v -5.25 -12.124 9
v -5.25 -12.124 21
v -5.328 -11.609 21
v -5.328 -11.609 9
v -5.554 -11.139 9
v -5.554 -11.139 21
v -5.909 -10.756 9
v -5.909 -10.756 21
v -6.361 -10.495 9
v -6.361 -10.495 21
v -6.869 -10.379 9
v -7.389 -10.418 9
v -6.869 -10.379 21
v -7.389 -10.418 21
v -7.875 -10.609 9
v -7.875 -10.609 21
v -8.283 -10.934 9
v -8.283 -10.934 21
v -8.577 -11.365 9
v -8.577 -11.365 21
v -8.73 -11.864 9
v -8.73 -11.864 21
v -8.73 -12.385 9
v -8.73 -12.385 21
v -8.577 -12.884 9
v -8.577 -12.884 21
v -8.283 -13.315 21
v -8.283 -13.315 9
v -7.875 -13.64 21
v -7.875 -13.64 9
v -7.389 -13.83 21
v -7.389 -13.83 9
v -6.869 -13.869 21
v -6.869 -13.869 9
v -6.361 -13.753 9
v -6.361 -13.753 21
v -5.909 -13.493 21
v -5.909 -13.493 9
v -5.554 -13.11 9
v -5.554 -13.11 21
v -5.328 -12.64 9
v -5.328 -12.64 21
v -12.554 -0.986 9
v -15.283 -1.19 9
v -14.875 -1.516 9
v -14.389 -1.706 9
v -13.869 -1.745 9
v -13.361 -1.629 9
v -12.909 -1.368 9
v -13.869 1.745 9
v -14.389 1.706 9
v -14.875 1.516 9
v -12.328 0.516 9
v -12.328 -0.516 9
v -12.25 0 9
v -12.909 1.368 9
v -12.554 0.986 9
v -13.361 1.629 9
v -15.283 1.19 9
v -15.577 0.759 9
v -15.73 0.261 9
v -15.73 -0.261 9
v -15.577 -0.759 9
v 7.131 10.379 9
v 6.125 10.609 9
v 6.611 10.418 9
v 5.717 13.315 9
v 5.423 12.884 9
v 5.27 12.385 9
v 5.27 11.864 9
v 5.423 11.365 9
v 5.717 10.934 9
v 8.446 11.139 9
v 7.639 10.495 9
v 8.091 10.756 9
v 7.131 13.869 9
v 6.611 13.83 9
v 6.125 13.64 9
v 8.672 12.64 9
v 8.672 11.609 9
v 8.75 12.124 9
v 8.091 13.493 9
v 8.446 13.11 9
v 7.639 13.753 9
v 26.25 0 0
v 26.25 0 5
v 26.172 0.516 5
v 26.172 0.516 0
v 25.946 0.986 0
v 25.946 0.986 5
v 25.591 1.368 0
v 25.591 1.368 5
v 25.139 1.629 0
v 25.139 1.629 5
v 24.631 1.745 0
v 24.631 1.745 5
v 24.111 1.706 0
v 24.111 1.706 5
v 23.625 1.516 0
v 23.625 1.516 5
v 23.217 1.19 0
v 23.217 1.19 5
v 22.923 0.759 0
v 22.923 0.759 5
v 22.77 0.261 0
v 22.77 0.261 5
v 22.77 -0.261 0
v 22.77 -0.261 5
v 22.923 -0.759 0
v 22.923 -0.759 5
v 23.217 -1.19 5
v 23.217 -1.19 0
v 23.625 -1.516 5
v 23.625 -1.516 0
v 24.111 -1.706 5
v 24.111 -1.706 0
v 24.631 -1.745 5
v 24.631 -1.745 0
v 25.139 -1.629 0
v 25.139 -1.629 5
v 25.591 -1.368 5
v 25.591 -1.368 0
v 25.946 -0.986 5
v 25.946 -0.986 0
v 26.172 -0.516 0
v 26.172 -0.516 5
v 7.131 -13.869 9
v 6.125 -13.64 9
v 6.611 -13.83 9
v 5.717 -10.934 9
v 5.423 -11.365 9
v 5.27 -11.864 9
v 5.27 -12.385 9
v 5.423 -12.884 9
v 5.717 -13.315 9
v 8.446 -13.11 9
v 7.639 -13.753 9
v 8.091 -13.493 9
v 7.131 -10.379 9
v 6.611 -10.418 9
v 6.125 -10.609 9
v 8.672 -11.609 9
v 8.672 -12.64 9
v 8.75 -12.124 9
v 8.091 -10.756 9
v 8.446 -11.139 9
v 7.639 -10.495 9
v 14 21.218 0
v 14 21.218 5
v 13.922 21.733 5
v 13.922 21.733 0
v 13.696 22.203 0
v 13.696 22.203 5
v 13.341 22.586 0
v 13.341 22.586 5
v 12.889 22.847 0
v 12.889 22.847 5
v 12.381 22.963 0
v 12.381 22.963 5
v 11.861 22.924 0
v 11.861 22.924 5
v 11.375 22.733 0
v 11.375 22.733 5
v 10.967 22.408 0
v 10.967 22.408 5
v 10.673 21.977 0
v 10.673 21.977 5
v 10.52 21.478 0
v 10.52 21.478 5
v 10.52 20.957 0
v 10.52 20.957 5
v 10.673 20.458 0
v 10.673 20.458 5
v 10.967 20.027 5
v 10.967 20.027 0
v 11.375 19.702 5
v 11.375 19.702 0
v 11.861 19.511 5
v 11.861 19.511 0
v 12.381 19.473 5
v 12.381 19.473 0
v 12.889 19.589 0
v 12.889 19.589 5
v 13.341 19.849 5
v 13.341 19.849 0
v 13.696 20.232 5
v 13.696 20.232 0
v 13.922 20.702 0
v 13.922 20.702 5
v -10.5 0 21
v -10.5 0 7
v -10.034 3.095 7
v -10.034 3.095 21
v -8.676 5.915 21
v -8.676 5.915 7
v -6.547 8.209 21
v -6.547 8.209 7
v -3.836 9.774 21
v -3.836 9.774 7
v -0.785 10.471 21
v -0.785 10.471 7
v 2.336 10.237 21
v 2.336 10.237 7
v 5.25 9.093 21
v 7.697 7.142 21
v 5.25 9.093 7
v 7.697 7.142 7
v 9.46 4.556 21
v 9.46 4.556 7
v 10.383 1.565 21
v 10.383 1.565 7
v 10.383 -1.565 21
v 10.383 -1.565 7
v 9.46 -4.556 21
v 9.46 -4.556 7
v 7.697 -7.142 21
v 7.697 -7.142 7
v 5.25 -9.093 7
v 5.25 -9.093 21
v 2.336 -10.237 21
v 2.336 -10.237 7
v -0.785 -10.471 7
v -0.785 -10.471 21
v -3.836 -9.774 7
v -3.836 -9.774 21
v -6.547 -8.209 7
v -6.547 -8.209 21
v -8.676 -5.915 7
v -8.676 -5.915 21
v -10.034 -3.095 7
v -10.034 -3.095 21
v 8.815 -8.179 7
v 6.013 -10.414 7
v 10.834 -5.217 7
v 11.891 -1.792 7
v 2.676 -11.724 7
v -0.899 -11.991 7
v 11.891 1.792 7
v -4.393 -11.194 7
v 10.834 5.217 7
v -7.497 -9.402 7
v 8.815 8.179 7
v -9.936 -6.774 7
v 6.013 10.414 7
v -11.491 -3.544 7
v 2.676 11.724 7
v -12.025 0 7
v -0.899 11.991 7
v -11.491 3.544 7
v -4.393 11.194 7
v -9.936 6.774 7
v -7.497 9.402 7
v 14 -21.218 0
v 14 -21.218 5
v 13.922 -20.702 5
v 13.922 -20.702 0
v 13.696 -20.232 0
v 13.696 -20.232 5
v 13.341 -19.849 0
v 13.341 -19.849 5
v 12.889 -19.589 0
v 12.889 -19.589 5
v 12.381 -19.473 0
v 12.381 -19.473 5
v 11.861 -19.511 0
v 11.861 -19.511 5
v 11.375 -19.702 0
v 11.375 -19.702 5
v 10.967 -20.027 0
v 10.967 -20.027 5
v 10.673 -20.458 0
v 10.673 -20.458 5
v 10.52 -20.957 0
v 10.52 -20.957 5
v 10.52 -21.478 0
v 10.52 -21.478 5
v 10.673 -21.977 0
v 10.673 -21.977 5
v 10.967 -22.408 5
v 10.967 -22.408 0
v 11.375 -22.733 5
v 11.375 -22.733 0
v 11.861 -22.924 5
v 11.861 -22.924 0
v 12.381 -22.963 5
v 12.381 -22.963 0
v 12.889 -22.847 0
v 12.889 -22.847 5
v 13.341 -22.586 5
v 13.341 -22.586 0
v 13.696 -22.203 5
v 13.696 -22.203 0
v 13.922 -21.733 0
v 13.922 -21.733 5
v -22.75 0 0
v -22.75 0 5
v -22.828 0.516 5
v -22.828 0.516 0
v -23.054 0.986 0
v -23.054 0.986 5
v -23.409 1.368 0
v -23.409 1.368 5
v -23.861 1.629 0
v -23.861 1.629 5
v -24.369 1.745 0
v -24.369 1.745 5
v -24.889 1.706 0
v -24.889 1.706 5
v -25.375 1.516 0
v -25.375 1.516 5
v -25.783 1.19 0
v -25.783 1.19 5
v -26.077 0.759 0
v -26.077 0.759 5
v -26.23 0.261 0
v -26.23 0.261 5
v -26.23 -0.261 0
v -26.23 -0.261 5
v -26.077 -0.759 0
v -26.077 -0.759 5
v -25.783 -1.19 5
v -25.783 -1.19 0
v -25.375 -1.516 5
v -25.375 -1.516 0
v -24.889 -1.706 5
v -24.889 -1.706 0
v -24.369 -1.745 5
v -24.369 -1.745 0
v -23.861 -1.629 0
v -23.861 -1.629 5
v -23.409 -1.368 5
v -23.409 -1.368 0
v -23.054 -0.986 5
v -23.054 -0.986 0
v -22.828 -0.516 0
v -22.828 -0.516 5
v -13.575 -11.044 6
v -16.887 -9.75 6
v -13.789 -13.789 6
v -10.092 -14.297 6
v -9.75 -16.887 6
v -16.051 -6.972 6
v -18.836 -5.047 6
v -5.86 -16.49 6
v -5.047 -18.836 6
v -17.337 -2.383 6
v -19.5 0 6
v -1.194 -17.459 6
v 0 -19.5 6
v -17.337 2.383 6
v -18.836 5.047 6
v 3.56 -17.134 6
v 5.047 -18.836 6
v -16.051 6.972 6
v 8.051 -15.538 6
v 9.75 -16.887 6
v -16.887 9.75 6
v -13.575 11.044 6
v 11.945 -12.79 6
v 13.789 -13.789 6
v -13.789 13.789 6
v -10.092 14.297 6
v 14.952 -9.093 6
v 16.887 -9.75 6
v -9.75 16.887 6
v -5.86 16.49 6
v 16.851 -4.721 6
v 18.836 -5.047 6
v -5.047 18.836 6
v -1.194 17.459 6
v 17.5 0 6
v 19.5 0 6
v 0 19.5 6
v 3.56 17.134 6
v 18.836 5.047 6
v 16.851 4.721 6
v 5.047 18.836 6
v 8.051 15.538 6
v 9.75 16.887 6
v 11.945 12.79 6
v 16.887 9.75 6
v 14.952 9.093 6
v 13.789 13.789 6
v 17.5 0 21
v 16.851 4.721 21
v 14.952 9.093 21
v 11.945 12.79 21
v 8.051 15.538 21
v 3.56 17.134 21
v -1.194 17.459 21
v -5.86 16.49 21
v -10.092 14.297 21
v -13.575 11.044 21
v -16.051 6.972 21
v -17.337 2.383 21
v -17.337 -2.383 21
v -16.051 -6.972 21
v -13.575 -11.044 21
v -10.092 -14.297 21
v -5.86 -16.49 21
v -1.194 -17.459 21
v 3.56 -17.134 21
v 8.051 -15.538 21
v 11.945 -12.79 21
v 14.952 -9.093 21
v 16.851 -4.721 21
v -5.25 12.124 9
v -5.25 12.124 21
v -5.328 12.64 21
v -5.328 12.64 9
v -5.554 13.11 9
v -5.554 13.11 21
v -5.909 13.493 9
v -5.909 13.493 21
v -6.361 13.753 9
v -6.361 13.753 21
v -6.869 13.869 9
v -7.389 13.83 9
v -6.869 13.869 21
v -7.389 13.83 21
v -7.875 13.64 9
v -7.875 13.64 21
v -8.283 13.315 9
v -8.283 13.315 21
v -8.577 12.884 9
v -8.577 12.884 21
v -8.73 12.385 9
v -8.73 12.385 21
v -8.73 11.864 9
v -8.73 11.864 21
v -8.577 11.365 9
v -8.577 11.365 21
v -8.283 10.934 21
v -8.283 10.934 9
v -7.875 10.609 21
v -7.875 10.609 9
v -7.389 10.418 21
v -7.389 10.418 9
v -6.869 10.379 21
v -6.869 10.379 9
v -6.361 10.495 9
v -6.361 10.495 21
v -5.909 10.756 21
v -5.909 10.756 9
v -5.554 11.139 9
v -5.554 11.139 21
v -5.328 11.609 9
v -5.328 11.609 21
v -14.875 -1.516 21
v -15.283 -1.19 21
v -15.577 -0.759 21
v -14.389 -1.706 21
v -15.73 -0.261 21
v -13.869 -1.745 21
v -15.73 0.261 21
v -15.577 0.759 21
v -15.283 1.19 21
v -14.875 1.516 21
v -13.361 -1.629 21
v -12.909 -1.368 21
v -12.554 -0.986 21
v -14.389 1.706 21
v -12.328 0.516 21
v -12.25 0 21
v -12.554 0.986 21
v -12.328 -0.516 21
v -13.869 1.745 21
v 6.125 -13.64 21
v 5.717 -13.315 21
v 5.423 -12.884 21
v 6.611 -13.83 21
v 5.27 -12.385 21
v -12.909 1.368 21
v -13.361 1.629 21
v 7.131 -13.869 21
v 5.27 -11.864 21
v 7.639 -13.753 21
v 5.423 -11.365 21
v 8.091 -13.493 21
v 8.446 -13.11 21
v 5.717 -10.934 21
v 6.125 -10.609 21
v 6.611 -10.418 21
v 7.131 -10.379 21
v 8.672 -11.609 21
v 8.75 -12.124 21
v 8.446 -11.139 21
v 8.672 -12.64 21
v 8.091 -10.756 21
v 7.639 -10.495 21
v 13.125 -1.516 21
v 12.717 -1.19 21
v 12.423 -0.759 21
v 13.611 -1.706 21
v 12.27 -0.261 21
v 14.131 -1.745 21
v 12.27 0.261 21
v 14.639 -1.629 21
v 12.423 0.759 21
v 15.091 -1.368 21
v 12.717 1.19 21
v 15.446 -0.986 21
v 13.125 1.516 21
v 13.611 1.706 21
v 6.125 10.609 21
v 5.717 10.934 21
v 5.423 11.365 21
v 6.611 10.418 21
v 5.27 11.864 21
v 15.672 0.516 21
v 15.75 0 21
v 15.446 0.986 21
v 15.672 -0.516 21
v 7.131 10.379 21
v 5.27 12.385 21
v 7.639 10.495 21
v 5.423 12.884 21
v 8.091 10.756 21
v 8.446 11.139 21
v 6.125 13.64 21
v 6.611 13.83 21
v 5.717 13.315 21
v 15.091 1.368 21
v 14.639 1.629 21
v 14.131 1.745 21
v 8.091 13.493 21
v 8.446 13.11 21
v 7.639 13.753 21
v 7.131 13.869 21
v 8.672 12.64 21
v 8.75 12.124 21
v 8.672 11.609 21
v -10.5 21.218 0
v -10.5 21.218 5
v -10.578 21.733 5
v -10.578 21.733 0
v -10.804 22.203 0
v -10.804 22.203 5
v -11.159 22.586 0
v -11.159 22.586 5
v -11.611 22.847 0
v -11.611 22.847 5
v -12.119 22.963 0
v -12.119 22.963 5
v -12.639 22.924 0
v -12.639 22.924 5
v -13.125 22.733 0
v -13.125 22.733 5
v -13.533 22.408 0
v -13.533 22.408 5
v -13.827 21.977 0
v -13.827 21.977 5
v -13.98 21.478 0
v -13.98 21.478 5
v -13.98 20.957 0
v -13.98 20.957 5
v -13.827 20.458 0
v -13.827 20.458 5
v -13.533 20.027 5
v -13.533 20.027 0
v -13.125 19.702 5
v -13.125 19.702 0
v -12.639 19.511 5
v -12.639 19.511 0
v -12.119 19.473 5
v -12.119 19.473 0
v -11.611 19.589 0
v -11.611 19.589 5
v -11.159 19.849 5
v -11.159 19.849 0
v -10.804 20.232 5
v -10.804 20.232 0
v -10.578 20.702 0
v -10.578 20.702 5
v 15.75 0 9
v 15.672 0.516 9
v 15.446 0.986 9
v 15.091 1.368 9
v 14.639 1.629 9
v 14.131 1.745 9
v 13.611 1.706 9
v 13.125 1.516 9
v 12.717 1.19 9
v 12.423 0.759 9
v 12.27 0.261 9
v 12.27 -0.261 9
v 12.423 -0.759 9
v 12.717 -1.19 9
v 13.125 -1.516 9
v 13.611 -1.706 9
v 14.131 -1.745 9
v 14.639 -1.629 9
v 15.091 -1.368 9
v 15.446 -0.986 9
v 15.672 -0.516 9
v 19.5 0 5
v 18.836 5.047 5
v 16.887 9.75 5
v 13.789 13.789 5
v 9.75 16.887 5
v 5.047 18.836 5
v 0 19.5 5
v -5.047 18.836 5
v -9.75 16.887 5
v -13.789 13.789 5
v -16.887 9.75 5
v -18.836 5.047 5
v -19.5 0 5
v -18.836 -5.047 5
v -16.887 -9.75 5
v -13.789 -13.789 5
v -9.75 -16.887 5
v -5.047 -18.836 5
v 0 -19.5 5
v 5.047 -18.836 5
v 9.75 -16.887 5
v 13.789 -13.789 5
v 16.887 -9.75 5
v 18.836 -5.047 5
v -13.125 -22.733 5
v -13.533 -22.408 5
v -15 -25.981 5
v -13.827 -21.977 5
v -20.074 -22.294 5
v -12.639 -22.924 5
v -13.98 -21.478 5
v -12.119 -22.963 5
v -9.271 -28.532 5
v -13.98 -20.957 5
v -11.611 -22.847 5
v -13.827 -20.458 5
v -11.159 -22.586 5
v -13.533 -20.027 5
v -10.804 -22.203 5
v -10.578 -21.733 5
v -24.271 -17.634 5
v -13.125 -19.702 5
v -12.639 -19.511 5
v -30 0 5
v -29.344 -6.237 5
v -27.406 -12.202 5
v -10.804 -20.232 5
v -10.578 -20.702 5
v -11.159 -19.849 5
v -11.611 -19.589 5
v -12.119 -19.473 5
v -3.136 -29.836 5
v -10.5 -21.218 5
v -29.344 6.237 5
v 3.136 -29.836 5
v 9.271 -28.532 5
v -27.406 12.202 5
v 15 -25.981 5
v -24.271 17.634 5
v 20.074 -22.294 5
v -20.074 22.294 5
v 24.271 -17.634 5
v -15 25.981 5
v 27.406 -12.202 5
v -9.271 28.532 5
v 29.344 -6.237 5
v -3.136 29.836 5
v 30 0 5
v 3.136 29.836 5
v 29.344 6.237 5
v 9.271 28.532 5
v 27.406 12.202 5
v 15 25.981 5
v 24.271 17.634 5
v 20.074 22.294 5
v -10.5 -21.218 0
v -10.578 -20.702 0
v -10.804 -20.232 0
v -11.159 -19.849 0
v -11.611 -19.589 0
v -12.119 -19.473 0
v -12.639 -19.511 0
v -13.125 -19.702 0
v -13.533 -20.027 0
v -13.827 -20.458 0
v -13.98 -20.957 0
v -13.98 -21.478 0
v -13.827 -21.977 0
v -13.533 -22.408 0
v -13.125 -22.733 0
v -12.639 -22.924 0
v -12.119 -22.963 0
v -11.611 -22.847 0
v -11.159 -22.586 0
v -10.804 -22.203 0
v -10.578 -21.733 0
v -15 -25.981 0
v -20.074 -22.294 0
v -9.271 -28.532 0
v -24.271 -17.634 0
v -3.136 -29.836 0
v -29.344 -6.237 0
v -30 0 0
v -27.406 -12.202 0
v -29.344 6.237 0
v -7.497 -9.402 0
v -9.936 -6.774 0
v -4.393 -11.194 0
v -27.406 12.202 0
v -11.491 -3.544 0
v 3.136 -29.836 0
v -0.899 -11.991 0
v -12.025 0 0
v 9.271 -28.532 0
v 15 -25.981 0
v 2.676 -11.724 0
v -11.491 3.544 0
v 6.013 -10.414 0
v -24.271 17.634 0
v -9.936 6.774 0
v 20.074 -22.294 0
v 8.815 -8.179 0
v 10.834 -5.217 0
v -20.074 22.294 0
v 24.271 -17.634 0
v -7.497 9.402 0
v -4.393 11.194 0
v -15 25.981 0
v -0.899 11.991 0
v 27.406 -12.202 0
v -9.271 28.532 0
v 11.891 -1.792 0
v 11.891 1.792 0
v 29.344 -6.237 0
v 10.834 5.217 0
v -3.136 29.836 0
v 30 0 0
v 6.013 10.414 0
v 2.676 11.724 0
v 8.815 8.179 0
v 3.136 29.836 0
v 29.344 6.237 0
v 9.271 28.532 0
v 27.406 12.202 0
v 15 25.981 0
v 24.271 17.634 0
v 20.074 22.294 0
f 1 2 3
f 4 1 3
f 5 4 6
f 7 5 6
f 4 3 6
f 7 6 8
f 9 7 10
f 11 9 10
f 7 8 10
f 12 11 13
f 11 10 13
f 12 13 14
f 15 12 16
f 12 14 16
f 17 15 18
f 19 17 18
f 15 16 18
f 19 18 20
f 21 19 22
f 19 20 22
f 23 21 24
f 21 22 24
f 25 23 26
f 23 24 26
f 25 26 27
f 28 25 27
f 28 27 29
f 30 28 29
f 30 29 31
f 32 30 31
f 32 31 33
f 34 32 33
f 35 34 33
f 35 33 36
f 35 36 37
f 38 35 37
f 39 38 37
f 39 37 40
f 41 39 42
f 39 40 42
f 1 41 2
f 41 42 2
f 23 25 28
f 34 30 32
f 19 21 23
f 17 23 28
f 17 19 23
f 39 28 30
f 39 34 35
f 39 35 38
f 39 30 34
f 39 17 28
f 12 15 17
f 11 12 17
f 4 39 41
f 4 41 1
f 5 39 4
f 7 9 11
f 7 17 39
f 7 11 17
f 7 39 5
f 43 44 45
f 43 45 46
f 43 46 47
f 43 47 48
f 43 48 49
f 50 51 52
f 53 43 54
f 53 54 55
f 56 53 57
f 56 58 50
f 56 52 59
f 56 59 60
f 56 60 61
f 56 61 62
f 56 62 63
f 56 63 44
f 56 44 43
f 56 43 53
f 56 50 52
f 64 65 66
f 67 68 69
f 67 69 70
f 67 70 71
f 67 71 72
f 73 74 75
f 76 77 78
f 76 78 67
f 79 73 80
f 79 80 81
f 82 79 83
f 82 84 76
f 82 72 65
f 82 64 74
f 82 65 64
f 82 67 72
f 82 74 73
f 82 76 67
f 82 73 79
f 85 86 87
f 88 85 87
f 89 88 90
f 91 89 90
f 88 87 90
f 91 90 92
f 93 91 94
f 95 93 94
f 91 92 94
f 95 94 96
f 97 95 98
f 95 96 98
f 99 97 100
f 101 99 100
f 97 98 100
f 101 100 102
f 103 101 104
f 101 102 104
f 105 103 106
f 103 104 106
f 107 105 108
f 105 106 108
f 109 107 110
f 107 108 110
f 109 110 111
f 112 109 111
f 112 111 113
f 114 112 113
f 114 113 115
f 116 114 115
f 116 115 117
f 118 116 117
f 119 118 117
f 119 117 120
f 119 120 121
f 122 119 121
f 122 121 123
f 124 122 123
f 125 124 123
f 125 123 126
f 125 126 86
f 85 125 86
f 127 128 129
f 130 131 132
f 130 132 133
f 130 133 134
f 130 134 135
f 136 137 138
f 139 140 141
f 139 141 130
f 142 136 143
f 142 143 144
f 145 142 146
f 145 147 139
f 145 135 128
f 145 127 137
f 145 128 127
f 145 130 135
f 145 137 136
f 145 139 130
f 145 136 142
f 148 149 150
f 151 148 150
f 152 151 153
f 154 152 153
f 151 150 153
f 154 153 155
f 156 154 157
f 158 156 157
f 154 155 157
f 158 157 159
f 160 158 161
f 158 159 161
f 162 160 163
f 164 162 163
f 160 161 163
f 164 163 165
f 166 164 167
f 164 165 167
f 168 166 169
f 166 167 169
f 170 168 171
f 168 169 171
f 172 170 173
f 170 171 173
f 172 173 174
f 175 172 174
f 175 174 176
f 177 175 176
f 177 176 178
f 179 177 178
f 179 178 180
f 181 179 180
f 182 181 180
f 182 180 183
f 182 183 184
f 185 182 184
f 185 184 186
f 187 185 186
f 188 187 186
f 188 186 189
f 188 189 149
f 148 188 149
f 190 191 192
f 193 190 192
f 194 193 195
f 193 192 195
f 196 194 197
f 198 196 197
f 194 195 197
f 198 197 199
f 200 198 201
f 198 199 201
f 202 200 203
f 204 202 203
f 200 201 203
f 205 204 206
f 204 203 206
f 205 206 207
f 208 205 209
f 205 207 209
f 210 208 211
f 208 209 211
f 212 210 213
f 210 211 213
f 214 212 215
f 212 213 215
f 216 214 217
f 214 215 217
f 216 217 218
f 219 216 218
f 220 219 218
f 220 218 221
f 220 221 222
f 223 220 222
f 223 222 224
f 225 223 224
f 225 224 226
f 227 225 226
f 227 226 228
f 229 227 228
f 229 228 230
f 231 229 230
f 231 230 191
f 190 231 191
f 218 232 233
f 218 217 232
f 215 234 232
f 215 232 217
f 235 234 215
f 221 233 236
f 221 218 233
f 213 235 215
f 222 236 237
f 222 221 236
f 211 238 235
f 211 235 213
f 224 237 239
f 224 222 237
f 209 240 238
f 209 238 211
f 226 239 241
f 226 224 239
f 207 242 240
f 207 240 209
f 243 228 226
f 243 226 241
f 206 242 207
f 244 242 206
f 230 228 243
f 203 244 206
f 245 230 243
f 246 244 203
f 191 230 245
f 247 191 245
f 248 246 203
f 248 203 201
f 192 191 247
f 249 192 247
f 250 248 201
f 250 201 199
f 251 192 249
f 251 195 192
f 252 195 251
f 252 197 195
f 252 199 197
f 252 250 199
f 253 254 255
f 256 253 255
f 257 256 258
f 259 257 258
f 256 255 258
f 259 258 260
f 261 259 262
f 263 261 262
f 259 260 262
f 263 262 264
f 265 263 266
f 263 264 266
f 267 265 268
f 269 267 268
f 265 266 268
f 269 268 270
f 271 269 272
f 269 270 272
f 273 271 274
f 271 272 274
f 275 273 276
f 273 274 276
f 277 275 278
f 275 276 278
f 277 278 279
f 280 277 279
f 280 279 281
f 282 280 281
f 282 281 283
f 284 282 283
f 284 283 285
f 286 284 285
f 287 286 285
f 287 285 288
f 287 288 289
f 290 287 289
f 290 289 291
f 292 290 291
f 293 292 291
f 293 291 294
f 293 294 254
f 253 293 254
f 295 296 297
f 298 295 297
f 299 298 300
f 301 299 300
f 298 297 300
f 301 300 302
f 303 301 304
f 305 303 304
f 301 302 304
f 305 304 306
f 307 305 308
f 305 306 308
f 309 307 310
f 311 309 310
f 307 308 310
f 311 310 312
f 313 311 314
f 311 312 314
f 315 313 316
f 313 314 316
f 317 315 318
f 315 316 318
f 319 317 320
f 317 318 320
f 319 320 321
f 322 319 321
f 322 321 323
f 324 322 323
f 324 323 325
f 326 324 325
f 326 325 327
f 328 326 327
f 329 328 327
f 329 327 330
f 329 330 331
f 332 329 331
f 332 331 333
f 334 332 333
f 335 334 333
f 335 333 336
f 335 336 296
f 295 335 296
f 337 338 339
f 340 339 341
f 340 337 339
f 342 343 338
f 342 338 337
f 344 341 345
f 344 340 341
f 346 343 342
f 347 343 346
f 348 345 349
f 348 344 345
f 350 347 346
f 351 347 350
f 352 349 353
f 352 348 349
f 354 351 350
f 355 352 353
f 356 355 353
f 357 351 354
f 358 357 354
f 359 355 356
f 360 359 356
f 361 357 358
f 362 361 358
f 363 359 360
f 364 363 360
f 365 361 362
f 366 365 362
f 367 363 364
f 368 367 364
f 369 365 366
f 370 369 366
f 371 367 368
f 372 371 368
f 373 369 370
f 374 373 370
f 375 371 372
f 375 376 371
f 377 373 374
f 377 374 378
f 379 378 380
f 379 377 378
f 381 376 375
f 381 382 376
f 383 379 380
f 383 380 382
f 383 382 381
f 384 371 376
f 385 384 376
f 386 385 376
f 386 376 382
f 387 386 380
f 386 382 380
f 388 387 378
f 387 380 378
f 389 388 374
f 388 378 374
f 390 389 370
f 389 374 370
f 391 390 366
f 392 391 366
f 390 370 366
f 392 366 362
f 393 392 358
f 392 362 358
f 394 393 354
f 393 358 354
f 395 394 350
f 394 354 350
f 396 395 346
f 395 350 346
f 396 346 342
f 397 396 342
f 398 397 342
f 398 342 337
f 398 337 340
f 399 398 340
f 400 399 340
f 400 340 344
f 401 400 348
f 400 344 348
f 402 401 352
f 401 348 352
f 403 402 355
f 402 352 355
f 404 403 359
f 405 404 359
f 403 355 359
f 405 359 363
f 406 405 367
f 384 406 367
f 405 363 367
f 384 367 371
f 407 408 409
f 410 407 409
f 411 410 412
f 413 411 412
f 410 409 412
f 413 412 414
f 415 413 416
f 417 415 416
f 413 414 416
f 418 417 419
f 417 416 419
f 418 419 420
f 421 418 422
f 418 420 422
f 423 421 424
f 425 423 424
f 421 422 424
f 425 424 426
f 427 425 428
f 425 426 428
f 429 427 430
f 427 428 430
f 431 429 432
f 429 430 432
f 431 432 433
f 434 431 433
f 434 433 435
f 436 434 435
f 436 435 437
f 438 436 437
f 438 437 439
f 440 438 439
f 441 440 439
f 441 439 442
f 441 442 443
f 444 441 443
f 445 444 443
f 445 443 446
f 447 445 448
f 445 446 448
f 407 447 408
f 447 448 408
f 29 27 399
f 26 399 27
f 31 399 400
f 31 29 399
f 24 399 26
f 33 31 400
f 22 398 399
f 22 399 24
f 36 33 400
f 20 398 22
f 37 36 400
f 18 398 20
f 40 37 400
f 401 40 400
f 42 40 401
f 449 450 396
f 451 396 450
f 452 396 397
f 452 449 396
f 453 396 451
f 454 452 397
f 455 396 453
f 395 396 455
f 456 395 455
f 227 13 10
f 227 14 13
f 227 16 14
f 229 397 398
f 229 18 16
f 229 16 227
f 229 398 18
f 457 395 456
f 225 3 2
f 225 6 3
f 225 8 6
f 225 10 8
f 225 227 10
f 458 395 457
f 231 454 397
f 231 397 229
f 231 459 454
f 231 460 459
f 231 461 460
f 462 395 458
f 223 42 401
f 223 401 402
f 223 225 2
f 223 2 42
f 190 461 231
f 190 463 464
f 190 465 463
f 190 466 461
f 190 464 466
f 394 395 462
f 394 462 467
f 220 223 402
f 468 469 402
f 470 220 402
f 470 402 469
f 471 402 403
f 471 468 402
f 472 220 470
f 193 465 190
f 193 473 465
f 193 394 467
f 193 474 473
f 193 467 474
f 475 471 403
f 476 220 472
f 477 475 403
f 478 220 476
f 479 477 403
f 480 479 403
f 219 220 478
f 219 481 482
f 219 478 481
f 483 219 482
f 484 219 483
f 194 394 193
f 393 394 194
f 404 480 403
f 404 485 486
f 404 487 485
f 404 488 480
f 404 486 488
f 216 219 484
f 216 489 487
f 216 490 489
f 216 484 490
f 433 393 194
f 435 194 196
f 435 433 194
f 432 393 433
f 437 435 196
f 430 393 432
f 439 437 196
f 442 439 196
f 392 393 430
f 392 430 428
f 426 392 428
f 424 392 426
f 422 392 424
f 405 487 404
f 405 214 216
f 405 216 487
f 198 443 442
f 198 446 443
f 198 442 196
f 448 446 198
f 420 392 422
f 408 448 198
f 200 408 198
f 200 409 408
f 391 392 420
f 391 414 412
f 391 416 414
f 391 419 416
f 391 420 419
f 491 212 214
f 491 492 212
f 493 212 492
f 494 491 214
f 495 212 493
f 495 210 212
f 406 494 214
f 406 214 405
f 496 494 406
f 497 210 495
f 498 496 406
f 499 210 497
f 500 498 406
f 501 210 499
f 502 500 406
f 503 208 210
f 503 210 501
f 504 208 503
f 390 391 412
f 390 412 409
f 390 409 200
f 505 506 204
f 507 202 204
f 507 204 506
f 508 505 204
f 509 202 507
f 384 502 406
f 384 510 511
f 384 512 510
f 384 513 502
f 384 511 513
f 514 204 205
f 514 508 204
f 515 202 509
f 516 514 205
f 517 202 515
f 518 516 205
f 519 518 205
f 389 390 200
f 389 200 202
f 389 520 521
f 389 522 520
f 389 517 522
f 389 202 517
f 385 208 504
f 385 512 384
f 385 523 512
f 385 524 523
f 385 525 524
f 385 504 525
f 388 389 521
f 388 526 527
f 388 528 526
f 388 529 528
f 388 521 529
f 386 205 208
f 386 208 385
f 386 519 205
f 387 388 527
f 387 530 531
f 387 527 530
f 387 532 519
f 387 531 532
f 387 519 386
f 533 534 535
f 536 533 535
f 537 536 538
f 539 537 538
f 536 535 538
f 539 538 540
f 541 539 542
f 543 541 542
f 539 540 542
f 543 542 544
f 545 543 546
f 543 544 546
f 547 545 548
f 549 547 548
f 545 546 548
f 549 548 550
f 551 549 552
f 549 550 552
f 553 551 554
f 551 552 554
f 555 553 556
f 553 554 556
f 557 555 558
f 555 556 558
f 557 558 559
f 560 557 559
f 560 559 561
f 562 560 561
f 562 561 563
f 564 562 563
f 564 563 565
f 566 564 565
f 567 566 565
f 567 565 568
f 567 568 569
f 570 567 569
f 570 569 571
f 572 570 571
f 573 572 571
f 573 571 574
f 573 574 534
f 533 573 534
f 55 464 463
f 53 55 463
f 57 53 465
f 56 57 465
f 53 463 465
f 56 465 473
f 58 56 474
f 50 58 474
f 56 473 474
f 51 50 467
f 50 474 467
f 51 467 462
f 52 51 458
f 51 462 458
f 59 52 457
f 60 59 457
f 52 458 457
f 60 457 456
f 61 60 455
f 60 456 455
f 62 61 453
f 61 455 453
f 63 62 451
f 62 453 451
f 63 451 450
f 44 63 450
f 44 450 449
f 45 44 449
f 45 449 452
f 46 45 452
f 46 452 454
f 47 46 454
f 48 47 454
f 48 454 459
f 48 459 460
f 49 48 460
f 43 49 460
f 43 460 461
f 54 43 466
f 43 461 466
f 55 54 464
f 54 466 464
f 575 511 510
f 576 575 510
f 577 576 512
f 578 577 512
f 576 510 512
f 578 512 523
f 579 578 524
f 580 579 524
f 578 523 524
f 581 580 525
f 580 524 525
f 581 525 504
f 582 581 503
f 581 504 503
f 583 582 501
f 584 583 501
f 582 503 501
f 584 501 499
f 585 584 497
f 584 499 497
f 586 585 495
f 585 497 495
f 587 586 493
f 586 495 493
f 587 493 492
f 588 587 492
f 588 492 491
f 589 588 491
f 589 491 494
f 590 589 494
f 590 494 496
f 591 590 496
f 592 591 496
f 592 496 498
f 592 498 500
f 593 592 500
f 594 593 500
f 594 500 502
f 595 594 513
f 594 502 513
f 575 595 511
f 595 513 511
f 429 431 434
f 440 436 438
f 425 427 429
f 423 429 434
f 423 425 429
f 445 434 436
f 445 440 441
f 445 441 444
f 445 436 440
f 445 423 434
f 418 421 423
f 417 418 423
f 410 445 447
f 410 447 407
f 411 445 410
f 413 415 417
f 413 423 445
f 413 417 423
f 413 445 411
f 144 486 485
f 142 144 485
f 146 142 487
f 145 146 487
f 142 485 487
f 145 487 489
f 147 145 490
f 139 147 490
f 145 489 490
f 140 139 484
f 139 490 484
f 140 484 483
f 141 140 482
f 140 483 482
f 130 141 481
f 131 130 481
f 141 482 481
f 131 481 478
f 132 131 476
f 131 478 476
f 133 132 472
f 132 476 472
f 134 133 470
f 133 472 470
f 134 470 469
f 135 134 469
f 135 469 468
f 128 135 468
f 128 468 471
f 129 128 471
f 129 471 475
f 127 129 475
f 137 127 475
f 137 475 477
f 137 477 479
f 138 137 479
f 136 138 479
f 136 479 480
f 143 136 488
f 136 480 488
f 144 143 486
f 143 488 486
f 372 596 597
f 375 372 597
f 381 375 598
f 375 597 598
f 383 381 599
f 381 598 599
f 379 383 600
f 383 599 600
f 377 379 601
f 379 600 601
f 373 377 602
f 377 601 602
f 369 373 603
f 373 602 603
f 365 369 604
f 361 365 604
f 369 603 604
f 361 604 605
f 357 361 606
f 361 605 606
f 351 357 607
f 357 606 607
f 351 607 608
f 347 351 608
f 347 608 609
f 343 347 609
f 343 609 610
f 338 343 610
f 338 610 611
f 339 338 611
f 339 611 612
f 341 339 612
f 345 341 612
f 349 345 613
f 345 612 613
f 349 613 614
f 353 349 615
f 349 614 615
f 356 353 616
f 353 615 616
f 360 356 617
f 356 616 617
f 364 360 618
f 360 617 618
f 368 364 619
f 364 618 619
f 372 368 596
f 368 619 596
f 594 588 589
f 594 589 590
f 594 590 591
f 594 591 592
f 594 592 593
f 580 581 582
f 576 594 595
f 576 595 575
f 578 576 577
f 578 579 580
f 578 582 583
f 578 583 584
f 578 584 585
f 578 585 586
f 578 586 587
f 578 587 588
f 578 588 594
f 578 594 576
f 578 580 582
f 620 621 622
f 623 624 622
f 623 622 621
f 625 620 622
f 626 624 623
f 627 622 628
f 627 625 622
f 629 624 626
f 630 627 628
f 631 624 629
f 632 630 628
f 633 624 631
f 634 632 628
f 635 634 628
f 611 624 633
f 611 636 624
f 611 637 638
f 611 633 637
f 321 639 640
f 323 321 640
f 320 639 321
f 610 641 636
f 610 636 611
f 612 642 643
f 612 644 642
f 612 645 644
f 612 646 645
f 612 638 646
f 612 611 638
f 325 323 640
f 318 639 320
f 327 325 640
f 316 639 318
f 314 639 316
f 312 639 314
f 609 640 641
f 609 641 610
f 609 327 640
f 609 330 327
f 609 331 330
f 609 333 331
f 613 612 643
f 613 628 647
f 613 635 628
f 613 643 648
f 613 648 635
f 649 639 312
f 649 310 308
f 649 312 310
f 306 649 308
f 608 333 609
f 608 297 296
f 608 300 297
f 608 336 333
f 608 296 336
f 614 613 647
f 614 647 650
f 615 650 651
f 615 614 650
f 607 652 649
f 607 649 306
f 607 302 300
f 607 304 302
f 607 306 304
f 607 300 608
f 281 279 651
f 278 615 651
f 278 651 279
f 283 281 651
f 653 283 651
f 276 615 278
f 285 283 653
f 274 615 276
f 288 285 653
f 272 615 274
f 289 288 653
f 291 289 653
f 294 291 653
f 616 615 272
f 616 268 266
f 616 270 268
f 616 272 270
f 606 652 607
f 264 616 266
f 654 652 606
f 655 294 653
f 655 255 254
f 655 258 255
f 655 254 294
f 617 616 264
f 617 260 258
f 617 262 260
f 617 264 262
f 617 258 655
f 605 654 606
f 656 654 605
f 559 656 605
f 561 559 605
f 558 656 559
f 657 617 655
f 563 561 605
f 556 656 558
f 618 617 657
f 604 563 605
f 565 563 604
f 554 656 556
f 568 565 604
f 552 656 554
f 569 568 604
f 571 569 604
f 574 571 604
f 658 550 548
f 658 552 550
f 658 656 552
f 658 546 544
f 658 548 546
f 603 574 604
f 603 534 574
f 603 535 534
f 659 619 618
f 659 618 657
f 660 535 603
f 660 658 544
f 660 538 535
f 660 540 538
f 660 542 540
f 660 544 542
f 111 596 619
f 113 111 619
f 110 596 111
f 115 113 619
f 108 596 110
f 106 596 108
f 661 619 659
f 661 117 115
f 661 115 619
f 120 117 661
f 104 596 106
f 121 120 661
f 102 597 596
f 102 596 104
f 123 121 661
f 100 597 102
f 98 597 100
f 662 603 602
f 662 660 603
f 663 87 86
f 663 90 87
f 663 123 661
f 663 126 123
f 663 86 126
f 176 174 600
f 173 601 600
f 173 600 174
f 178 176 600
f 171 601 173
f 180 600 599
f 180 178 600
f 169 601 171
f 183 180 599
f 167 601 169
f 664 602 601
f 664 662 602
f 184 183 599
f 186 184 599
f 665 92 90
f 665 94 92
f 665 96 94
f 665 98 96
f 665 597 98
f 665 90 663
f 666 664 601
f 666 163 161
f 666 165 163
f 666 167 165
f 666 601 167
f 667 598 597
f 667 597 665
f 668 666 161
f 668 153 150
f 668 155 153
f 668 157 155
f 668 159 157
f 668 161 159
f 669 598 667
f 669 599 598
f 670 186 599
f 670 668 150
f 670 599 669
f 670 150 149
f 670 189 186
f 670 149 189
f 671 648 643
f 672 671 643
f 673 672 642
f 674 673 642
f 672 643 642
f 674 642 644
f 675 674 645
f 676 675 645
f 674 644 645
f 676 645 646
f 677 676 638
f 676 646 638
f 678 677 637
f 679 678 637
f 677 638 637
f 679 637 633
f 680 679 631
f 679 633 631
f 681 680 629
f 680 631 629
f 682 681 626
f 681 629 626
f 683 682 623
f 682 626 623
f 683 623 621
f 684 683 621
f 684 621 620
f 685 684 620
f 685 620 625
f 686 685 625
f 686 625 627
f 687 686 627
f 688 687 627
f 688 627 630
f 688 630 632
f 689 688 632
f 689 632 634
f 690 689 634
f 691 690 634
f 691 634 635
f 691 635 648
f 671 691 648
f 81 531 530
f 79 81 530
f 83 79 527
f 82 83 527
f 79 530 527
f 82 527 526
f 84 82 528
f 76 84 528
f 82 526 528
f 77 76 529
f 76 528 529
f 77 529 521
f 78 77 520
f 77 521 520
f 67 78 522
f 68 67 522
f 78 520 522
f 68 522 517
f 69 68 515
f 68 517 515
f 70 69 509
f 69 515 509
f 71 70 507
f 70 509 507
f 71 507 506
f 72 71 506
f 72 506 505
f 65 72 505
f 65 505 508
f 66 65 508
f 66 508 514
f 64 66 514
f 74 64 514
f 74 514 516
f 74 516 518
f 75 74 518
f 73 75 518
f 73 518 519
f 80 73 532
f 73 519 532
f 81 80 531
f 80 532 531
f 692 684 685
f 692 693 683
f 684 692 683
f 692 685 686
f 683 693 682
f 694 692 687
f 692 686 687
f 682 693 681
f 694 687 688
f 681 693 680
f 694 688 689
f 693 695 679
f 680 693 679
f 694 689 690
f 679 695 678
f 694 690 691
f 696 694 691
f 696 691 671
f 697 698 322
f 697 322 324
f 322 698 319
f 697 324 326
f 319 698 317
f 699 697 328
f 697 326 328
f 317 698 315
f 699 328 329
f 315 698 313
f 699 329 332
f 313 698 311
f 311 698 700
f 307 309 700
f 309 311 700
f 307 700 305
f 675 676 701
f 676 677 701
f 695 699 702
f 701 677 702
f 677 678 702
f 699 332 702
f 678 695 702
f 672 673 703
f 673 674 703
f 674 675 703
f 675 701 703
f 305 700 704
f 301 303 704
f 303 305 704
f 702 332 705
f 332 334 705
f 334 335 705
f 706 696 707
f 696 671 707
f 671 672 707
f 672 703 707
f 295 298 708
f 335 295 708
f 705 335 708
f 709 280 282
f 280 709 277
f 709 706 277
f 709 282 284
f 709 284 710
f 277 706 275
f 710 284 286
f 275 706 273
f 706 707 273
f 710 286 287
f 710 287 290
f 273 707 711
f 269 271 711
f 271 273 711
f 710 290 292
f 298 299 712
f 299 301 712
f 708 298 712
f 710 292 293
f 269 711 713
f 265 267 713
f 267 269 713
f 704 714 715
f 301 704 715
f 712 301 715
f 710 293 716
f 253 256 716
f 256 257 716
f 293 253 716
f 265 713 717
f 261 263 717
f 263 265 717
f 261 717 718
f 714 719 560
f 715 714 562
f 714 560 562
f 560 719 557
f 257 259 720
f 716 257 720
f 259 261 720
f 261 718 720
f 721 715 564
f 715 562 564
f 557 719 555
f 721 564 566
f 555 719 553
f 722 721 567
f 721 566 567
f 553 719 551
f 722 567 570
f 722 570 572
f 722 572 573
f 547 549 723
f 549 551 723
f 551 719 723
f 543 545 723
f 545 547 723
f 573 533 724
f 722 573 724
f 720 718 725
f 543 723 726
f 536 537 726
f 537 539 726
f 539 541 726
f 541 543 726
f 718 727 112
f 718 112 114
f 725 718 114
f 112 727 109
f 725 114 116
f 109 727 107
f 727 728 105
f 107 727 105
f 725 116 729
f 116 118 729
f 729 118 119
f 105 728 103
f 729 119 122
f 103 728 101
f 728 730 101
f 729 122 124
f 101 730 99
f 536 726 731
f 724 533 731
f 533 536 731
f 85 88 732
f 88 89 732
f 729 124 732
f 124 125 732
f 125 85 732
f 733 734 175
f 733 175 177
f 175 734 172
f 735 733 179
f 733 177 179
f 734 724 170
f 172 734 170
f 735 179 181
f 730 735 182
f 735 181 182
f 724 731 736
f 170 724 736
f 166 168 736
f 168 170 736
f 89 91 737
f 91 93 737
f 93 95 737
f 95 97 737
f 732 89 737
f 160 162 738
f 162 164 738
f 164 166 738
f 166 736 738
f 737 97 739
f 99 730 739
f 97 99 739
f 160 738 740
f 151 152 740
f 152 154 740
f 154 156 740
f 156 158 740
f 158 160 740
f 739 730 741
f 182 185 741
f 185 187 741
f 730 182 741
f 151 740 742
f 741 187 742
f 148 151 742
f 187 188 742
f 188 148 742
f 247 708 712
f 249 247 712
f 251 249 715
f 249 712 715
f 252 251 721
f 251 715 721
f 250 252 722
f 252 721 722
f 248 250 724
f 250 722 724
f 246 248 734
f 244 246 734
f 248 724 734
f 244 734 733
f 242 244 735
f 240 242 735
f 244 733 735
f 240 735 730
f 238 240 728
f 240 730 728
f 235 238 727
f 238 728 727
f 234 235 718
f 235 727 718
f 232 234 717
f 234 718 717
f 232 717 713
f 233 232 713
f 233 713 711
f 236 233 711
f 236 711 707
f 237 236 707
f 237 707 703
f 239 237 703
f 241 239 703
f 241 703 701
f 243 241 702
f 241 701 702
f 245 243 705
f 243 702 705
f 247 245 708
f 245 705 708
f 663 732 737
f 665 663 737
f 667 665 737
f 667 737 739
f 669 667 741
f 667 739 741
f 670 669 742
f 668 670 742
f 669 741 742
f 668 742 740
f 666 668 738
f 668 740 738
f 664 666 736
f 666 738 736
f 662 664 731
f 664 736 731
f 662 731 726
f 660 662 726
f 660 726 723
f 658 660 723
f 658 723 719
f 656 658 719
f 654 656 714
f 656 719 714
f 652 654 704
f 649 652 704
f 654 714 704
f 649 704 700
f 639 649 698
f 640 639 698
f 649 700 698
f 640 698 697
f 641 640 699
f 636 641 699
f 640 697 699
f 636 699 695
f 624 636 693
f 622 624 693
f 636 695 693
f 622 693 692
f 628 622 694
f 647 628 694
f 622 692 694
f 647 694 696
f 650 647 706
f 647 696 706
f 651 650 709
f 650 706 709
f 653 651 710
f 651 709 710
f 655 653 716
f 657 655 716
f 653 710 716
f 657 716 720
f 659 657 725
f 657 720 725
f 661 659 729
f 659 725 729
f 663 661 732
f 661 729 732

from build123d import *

# Parameters (mm, degrees)
SKETCH1_R           = 30
BOSS_EXTRUDE1_DEPTH = 5
SKETCH2_R           = 19.5
BOSS_EXTRUDE2_DEPTH = 1
SKETCH3_R           = 17.5
BOSS_EXTRUDE3_DEPTH = 15
SKETCH4_R           = 12.025
CUT_EXTRUDE1_DEPTH  = 7
SKETCH5_R           = 10.5
CUT_EXTRUDE2_DEPTH  = 45.676615807
SKETCH6_R           = 1.75
CUT_EXTRUDE3_DEPTH  = 46.343136195
SKETCH7_R           = 1.75
CUT_EXTRUDE4_DEPTH  = 12


with BuildPart() as part:
    # Sketch1 → Boss-Extrude1 (new body)
    with BuildSketch(Plane.XY):
        Circle(SKETCH1_R)
    extrude(amount=BOSS_EXTRUDE1_DEPTH)

    # Sketch2 → Boss-Extrude2 (add)
    with BuildSketch(Plane.XY.offset(5)):
        Circle(SKETCH2_R)
    extrude(amount=BOSS_EXTRUDE2_DEPTH)

    # Sketch3 → Boss-Extrude3 (add)
    with BuildSketch(Plane.XY.offset(6)):
        Circle(SKETCH3_R)
    extrude(amount=BOSS_EXTRUDE3_DEPTH)

    # Sketch4 → Cut-Extrude1 (cut)
    with BuildSketch(Plane(origin=(0, 0, 0), x_dir=(-1, 0, 0), z_dir=(0, 0, -1))):
        Circle(SKETCH4_R)
    extrude(amount=-CUT_EXTRUDE1_DEPTH, mode=Mode.SUBTRACT)

    # Sketch5 → Cut-Extrude2 (cut, through all)
    with BuildSketch(Plane(origin=(0, 0, 7), x_dir=(-1, 0, 0), z_dir=(0, 0, -1))):
        Circle(SKETCH5_R)
    extrude(amount=-CUT_EXTRUDE2_DEPTH, mode=Mode.SUBTRACT)

    # Sketch6 → Cut-Extrude3 (cut, through all)
    with BuildSketch(Plane.XY.offset(5)):
        with Locations((24.5, 0)):
            Circle(SKETCH6_R)
        with Locations((12.25, -21.217622393)):
            Circle(SKETCH6_R)
        with Locations((-12.25, -21.217622393)):
            Circle(SKETCH6_R)
        with Locations((-24.5, 0)):
            Circle(SKETCH6_R)
        with Locations((-12.25, 21.217622393)):
            Circle(SKETCH6_R)
        with Locations((12.25, 21.217622393)):
            Circle(SKETCH6_R)
    extrude(amount=-CUT_EXTRUDE3_DEPTH, mode=Mode.SUBTRACT)

    # Sketch7 → Cut-Extrude4 (cut)
    with BuildSketch(Plane.XY.offset(21)):
        with Locations((14, 0)):
            Circle(SKETCH7_R)
        with Locations((7, -12.124355653)):
            Circle(SKETCH7_R)
        with Locations((-7, -12.124355653)):
            Circle(SKETCH7_R)
        with Locations((-14, 0)):
            Circle(SKETCH7_R)
        with Locations((-7, 12.124355653)):
            Circle(SKETCH7_R)
        with Locations((7, 12.124355653)):
            Circle(SKETCH7_R)
    extrude(amount=-CUT_EXTRUDE4_DEPTH, mode=Mode.SUBTRACT)


solid = part.part
